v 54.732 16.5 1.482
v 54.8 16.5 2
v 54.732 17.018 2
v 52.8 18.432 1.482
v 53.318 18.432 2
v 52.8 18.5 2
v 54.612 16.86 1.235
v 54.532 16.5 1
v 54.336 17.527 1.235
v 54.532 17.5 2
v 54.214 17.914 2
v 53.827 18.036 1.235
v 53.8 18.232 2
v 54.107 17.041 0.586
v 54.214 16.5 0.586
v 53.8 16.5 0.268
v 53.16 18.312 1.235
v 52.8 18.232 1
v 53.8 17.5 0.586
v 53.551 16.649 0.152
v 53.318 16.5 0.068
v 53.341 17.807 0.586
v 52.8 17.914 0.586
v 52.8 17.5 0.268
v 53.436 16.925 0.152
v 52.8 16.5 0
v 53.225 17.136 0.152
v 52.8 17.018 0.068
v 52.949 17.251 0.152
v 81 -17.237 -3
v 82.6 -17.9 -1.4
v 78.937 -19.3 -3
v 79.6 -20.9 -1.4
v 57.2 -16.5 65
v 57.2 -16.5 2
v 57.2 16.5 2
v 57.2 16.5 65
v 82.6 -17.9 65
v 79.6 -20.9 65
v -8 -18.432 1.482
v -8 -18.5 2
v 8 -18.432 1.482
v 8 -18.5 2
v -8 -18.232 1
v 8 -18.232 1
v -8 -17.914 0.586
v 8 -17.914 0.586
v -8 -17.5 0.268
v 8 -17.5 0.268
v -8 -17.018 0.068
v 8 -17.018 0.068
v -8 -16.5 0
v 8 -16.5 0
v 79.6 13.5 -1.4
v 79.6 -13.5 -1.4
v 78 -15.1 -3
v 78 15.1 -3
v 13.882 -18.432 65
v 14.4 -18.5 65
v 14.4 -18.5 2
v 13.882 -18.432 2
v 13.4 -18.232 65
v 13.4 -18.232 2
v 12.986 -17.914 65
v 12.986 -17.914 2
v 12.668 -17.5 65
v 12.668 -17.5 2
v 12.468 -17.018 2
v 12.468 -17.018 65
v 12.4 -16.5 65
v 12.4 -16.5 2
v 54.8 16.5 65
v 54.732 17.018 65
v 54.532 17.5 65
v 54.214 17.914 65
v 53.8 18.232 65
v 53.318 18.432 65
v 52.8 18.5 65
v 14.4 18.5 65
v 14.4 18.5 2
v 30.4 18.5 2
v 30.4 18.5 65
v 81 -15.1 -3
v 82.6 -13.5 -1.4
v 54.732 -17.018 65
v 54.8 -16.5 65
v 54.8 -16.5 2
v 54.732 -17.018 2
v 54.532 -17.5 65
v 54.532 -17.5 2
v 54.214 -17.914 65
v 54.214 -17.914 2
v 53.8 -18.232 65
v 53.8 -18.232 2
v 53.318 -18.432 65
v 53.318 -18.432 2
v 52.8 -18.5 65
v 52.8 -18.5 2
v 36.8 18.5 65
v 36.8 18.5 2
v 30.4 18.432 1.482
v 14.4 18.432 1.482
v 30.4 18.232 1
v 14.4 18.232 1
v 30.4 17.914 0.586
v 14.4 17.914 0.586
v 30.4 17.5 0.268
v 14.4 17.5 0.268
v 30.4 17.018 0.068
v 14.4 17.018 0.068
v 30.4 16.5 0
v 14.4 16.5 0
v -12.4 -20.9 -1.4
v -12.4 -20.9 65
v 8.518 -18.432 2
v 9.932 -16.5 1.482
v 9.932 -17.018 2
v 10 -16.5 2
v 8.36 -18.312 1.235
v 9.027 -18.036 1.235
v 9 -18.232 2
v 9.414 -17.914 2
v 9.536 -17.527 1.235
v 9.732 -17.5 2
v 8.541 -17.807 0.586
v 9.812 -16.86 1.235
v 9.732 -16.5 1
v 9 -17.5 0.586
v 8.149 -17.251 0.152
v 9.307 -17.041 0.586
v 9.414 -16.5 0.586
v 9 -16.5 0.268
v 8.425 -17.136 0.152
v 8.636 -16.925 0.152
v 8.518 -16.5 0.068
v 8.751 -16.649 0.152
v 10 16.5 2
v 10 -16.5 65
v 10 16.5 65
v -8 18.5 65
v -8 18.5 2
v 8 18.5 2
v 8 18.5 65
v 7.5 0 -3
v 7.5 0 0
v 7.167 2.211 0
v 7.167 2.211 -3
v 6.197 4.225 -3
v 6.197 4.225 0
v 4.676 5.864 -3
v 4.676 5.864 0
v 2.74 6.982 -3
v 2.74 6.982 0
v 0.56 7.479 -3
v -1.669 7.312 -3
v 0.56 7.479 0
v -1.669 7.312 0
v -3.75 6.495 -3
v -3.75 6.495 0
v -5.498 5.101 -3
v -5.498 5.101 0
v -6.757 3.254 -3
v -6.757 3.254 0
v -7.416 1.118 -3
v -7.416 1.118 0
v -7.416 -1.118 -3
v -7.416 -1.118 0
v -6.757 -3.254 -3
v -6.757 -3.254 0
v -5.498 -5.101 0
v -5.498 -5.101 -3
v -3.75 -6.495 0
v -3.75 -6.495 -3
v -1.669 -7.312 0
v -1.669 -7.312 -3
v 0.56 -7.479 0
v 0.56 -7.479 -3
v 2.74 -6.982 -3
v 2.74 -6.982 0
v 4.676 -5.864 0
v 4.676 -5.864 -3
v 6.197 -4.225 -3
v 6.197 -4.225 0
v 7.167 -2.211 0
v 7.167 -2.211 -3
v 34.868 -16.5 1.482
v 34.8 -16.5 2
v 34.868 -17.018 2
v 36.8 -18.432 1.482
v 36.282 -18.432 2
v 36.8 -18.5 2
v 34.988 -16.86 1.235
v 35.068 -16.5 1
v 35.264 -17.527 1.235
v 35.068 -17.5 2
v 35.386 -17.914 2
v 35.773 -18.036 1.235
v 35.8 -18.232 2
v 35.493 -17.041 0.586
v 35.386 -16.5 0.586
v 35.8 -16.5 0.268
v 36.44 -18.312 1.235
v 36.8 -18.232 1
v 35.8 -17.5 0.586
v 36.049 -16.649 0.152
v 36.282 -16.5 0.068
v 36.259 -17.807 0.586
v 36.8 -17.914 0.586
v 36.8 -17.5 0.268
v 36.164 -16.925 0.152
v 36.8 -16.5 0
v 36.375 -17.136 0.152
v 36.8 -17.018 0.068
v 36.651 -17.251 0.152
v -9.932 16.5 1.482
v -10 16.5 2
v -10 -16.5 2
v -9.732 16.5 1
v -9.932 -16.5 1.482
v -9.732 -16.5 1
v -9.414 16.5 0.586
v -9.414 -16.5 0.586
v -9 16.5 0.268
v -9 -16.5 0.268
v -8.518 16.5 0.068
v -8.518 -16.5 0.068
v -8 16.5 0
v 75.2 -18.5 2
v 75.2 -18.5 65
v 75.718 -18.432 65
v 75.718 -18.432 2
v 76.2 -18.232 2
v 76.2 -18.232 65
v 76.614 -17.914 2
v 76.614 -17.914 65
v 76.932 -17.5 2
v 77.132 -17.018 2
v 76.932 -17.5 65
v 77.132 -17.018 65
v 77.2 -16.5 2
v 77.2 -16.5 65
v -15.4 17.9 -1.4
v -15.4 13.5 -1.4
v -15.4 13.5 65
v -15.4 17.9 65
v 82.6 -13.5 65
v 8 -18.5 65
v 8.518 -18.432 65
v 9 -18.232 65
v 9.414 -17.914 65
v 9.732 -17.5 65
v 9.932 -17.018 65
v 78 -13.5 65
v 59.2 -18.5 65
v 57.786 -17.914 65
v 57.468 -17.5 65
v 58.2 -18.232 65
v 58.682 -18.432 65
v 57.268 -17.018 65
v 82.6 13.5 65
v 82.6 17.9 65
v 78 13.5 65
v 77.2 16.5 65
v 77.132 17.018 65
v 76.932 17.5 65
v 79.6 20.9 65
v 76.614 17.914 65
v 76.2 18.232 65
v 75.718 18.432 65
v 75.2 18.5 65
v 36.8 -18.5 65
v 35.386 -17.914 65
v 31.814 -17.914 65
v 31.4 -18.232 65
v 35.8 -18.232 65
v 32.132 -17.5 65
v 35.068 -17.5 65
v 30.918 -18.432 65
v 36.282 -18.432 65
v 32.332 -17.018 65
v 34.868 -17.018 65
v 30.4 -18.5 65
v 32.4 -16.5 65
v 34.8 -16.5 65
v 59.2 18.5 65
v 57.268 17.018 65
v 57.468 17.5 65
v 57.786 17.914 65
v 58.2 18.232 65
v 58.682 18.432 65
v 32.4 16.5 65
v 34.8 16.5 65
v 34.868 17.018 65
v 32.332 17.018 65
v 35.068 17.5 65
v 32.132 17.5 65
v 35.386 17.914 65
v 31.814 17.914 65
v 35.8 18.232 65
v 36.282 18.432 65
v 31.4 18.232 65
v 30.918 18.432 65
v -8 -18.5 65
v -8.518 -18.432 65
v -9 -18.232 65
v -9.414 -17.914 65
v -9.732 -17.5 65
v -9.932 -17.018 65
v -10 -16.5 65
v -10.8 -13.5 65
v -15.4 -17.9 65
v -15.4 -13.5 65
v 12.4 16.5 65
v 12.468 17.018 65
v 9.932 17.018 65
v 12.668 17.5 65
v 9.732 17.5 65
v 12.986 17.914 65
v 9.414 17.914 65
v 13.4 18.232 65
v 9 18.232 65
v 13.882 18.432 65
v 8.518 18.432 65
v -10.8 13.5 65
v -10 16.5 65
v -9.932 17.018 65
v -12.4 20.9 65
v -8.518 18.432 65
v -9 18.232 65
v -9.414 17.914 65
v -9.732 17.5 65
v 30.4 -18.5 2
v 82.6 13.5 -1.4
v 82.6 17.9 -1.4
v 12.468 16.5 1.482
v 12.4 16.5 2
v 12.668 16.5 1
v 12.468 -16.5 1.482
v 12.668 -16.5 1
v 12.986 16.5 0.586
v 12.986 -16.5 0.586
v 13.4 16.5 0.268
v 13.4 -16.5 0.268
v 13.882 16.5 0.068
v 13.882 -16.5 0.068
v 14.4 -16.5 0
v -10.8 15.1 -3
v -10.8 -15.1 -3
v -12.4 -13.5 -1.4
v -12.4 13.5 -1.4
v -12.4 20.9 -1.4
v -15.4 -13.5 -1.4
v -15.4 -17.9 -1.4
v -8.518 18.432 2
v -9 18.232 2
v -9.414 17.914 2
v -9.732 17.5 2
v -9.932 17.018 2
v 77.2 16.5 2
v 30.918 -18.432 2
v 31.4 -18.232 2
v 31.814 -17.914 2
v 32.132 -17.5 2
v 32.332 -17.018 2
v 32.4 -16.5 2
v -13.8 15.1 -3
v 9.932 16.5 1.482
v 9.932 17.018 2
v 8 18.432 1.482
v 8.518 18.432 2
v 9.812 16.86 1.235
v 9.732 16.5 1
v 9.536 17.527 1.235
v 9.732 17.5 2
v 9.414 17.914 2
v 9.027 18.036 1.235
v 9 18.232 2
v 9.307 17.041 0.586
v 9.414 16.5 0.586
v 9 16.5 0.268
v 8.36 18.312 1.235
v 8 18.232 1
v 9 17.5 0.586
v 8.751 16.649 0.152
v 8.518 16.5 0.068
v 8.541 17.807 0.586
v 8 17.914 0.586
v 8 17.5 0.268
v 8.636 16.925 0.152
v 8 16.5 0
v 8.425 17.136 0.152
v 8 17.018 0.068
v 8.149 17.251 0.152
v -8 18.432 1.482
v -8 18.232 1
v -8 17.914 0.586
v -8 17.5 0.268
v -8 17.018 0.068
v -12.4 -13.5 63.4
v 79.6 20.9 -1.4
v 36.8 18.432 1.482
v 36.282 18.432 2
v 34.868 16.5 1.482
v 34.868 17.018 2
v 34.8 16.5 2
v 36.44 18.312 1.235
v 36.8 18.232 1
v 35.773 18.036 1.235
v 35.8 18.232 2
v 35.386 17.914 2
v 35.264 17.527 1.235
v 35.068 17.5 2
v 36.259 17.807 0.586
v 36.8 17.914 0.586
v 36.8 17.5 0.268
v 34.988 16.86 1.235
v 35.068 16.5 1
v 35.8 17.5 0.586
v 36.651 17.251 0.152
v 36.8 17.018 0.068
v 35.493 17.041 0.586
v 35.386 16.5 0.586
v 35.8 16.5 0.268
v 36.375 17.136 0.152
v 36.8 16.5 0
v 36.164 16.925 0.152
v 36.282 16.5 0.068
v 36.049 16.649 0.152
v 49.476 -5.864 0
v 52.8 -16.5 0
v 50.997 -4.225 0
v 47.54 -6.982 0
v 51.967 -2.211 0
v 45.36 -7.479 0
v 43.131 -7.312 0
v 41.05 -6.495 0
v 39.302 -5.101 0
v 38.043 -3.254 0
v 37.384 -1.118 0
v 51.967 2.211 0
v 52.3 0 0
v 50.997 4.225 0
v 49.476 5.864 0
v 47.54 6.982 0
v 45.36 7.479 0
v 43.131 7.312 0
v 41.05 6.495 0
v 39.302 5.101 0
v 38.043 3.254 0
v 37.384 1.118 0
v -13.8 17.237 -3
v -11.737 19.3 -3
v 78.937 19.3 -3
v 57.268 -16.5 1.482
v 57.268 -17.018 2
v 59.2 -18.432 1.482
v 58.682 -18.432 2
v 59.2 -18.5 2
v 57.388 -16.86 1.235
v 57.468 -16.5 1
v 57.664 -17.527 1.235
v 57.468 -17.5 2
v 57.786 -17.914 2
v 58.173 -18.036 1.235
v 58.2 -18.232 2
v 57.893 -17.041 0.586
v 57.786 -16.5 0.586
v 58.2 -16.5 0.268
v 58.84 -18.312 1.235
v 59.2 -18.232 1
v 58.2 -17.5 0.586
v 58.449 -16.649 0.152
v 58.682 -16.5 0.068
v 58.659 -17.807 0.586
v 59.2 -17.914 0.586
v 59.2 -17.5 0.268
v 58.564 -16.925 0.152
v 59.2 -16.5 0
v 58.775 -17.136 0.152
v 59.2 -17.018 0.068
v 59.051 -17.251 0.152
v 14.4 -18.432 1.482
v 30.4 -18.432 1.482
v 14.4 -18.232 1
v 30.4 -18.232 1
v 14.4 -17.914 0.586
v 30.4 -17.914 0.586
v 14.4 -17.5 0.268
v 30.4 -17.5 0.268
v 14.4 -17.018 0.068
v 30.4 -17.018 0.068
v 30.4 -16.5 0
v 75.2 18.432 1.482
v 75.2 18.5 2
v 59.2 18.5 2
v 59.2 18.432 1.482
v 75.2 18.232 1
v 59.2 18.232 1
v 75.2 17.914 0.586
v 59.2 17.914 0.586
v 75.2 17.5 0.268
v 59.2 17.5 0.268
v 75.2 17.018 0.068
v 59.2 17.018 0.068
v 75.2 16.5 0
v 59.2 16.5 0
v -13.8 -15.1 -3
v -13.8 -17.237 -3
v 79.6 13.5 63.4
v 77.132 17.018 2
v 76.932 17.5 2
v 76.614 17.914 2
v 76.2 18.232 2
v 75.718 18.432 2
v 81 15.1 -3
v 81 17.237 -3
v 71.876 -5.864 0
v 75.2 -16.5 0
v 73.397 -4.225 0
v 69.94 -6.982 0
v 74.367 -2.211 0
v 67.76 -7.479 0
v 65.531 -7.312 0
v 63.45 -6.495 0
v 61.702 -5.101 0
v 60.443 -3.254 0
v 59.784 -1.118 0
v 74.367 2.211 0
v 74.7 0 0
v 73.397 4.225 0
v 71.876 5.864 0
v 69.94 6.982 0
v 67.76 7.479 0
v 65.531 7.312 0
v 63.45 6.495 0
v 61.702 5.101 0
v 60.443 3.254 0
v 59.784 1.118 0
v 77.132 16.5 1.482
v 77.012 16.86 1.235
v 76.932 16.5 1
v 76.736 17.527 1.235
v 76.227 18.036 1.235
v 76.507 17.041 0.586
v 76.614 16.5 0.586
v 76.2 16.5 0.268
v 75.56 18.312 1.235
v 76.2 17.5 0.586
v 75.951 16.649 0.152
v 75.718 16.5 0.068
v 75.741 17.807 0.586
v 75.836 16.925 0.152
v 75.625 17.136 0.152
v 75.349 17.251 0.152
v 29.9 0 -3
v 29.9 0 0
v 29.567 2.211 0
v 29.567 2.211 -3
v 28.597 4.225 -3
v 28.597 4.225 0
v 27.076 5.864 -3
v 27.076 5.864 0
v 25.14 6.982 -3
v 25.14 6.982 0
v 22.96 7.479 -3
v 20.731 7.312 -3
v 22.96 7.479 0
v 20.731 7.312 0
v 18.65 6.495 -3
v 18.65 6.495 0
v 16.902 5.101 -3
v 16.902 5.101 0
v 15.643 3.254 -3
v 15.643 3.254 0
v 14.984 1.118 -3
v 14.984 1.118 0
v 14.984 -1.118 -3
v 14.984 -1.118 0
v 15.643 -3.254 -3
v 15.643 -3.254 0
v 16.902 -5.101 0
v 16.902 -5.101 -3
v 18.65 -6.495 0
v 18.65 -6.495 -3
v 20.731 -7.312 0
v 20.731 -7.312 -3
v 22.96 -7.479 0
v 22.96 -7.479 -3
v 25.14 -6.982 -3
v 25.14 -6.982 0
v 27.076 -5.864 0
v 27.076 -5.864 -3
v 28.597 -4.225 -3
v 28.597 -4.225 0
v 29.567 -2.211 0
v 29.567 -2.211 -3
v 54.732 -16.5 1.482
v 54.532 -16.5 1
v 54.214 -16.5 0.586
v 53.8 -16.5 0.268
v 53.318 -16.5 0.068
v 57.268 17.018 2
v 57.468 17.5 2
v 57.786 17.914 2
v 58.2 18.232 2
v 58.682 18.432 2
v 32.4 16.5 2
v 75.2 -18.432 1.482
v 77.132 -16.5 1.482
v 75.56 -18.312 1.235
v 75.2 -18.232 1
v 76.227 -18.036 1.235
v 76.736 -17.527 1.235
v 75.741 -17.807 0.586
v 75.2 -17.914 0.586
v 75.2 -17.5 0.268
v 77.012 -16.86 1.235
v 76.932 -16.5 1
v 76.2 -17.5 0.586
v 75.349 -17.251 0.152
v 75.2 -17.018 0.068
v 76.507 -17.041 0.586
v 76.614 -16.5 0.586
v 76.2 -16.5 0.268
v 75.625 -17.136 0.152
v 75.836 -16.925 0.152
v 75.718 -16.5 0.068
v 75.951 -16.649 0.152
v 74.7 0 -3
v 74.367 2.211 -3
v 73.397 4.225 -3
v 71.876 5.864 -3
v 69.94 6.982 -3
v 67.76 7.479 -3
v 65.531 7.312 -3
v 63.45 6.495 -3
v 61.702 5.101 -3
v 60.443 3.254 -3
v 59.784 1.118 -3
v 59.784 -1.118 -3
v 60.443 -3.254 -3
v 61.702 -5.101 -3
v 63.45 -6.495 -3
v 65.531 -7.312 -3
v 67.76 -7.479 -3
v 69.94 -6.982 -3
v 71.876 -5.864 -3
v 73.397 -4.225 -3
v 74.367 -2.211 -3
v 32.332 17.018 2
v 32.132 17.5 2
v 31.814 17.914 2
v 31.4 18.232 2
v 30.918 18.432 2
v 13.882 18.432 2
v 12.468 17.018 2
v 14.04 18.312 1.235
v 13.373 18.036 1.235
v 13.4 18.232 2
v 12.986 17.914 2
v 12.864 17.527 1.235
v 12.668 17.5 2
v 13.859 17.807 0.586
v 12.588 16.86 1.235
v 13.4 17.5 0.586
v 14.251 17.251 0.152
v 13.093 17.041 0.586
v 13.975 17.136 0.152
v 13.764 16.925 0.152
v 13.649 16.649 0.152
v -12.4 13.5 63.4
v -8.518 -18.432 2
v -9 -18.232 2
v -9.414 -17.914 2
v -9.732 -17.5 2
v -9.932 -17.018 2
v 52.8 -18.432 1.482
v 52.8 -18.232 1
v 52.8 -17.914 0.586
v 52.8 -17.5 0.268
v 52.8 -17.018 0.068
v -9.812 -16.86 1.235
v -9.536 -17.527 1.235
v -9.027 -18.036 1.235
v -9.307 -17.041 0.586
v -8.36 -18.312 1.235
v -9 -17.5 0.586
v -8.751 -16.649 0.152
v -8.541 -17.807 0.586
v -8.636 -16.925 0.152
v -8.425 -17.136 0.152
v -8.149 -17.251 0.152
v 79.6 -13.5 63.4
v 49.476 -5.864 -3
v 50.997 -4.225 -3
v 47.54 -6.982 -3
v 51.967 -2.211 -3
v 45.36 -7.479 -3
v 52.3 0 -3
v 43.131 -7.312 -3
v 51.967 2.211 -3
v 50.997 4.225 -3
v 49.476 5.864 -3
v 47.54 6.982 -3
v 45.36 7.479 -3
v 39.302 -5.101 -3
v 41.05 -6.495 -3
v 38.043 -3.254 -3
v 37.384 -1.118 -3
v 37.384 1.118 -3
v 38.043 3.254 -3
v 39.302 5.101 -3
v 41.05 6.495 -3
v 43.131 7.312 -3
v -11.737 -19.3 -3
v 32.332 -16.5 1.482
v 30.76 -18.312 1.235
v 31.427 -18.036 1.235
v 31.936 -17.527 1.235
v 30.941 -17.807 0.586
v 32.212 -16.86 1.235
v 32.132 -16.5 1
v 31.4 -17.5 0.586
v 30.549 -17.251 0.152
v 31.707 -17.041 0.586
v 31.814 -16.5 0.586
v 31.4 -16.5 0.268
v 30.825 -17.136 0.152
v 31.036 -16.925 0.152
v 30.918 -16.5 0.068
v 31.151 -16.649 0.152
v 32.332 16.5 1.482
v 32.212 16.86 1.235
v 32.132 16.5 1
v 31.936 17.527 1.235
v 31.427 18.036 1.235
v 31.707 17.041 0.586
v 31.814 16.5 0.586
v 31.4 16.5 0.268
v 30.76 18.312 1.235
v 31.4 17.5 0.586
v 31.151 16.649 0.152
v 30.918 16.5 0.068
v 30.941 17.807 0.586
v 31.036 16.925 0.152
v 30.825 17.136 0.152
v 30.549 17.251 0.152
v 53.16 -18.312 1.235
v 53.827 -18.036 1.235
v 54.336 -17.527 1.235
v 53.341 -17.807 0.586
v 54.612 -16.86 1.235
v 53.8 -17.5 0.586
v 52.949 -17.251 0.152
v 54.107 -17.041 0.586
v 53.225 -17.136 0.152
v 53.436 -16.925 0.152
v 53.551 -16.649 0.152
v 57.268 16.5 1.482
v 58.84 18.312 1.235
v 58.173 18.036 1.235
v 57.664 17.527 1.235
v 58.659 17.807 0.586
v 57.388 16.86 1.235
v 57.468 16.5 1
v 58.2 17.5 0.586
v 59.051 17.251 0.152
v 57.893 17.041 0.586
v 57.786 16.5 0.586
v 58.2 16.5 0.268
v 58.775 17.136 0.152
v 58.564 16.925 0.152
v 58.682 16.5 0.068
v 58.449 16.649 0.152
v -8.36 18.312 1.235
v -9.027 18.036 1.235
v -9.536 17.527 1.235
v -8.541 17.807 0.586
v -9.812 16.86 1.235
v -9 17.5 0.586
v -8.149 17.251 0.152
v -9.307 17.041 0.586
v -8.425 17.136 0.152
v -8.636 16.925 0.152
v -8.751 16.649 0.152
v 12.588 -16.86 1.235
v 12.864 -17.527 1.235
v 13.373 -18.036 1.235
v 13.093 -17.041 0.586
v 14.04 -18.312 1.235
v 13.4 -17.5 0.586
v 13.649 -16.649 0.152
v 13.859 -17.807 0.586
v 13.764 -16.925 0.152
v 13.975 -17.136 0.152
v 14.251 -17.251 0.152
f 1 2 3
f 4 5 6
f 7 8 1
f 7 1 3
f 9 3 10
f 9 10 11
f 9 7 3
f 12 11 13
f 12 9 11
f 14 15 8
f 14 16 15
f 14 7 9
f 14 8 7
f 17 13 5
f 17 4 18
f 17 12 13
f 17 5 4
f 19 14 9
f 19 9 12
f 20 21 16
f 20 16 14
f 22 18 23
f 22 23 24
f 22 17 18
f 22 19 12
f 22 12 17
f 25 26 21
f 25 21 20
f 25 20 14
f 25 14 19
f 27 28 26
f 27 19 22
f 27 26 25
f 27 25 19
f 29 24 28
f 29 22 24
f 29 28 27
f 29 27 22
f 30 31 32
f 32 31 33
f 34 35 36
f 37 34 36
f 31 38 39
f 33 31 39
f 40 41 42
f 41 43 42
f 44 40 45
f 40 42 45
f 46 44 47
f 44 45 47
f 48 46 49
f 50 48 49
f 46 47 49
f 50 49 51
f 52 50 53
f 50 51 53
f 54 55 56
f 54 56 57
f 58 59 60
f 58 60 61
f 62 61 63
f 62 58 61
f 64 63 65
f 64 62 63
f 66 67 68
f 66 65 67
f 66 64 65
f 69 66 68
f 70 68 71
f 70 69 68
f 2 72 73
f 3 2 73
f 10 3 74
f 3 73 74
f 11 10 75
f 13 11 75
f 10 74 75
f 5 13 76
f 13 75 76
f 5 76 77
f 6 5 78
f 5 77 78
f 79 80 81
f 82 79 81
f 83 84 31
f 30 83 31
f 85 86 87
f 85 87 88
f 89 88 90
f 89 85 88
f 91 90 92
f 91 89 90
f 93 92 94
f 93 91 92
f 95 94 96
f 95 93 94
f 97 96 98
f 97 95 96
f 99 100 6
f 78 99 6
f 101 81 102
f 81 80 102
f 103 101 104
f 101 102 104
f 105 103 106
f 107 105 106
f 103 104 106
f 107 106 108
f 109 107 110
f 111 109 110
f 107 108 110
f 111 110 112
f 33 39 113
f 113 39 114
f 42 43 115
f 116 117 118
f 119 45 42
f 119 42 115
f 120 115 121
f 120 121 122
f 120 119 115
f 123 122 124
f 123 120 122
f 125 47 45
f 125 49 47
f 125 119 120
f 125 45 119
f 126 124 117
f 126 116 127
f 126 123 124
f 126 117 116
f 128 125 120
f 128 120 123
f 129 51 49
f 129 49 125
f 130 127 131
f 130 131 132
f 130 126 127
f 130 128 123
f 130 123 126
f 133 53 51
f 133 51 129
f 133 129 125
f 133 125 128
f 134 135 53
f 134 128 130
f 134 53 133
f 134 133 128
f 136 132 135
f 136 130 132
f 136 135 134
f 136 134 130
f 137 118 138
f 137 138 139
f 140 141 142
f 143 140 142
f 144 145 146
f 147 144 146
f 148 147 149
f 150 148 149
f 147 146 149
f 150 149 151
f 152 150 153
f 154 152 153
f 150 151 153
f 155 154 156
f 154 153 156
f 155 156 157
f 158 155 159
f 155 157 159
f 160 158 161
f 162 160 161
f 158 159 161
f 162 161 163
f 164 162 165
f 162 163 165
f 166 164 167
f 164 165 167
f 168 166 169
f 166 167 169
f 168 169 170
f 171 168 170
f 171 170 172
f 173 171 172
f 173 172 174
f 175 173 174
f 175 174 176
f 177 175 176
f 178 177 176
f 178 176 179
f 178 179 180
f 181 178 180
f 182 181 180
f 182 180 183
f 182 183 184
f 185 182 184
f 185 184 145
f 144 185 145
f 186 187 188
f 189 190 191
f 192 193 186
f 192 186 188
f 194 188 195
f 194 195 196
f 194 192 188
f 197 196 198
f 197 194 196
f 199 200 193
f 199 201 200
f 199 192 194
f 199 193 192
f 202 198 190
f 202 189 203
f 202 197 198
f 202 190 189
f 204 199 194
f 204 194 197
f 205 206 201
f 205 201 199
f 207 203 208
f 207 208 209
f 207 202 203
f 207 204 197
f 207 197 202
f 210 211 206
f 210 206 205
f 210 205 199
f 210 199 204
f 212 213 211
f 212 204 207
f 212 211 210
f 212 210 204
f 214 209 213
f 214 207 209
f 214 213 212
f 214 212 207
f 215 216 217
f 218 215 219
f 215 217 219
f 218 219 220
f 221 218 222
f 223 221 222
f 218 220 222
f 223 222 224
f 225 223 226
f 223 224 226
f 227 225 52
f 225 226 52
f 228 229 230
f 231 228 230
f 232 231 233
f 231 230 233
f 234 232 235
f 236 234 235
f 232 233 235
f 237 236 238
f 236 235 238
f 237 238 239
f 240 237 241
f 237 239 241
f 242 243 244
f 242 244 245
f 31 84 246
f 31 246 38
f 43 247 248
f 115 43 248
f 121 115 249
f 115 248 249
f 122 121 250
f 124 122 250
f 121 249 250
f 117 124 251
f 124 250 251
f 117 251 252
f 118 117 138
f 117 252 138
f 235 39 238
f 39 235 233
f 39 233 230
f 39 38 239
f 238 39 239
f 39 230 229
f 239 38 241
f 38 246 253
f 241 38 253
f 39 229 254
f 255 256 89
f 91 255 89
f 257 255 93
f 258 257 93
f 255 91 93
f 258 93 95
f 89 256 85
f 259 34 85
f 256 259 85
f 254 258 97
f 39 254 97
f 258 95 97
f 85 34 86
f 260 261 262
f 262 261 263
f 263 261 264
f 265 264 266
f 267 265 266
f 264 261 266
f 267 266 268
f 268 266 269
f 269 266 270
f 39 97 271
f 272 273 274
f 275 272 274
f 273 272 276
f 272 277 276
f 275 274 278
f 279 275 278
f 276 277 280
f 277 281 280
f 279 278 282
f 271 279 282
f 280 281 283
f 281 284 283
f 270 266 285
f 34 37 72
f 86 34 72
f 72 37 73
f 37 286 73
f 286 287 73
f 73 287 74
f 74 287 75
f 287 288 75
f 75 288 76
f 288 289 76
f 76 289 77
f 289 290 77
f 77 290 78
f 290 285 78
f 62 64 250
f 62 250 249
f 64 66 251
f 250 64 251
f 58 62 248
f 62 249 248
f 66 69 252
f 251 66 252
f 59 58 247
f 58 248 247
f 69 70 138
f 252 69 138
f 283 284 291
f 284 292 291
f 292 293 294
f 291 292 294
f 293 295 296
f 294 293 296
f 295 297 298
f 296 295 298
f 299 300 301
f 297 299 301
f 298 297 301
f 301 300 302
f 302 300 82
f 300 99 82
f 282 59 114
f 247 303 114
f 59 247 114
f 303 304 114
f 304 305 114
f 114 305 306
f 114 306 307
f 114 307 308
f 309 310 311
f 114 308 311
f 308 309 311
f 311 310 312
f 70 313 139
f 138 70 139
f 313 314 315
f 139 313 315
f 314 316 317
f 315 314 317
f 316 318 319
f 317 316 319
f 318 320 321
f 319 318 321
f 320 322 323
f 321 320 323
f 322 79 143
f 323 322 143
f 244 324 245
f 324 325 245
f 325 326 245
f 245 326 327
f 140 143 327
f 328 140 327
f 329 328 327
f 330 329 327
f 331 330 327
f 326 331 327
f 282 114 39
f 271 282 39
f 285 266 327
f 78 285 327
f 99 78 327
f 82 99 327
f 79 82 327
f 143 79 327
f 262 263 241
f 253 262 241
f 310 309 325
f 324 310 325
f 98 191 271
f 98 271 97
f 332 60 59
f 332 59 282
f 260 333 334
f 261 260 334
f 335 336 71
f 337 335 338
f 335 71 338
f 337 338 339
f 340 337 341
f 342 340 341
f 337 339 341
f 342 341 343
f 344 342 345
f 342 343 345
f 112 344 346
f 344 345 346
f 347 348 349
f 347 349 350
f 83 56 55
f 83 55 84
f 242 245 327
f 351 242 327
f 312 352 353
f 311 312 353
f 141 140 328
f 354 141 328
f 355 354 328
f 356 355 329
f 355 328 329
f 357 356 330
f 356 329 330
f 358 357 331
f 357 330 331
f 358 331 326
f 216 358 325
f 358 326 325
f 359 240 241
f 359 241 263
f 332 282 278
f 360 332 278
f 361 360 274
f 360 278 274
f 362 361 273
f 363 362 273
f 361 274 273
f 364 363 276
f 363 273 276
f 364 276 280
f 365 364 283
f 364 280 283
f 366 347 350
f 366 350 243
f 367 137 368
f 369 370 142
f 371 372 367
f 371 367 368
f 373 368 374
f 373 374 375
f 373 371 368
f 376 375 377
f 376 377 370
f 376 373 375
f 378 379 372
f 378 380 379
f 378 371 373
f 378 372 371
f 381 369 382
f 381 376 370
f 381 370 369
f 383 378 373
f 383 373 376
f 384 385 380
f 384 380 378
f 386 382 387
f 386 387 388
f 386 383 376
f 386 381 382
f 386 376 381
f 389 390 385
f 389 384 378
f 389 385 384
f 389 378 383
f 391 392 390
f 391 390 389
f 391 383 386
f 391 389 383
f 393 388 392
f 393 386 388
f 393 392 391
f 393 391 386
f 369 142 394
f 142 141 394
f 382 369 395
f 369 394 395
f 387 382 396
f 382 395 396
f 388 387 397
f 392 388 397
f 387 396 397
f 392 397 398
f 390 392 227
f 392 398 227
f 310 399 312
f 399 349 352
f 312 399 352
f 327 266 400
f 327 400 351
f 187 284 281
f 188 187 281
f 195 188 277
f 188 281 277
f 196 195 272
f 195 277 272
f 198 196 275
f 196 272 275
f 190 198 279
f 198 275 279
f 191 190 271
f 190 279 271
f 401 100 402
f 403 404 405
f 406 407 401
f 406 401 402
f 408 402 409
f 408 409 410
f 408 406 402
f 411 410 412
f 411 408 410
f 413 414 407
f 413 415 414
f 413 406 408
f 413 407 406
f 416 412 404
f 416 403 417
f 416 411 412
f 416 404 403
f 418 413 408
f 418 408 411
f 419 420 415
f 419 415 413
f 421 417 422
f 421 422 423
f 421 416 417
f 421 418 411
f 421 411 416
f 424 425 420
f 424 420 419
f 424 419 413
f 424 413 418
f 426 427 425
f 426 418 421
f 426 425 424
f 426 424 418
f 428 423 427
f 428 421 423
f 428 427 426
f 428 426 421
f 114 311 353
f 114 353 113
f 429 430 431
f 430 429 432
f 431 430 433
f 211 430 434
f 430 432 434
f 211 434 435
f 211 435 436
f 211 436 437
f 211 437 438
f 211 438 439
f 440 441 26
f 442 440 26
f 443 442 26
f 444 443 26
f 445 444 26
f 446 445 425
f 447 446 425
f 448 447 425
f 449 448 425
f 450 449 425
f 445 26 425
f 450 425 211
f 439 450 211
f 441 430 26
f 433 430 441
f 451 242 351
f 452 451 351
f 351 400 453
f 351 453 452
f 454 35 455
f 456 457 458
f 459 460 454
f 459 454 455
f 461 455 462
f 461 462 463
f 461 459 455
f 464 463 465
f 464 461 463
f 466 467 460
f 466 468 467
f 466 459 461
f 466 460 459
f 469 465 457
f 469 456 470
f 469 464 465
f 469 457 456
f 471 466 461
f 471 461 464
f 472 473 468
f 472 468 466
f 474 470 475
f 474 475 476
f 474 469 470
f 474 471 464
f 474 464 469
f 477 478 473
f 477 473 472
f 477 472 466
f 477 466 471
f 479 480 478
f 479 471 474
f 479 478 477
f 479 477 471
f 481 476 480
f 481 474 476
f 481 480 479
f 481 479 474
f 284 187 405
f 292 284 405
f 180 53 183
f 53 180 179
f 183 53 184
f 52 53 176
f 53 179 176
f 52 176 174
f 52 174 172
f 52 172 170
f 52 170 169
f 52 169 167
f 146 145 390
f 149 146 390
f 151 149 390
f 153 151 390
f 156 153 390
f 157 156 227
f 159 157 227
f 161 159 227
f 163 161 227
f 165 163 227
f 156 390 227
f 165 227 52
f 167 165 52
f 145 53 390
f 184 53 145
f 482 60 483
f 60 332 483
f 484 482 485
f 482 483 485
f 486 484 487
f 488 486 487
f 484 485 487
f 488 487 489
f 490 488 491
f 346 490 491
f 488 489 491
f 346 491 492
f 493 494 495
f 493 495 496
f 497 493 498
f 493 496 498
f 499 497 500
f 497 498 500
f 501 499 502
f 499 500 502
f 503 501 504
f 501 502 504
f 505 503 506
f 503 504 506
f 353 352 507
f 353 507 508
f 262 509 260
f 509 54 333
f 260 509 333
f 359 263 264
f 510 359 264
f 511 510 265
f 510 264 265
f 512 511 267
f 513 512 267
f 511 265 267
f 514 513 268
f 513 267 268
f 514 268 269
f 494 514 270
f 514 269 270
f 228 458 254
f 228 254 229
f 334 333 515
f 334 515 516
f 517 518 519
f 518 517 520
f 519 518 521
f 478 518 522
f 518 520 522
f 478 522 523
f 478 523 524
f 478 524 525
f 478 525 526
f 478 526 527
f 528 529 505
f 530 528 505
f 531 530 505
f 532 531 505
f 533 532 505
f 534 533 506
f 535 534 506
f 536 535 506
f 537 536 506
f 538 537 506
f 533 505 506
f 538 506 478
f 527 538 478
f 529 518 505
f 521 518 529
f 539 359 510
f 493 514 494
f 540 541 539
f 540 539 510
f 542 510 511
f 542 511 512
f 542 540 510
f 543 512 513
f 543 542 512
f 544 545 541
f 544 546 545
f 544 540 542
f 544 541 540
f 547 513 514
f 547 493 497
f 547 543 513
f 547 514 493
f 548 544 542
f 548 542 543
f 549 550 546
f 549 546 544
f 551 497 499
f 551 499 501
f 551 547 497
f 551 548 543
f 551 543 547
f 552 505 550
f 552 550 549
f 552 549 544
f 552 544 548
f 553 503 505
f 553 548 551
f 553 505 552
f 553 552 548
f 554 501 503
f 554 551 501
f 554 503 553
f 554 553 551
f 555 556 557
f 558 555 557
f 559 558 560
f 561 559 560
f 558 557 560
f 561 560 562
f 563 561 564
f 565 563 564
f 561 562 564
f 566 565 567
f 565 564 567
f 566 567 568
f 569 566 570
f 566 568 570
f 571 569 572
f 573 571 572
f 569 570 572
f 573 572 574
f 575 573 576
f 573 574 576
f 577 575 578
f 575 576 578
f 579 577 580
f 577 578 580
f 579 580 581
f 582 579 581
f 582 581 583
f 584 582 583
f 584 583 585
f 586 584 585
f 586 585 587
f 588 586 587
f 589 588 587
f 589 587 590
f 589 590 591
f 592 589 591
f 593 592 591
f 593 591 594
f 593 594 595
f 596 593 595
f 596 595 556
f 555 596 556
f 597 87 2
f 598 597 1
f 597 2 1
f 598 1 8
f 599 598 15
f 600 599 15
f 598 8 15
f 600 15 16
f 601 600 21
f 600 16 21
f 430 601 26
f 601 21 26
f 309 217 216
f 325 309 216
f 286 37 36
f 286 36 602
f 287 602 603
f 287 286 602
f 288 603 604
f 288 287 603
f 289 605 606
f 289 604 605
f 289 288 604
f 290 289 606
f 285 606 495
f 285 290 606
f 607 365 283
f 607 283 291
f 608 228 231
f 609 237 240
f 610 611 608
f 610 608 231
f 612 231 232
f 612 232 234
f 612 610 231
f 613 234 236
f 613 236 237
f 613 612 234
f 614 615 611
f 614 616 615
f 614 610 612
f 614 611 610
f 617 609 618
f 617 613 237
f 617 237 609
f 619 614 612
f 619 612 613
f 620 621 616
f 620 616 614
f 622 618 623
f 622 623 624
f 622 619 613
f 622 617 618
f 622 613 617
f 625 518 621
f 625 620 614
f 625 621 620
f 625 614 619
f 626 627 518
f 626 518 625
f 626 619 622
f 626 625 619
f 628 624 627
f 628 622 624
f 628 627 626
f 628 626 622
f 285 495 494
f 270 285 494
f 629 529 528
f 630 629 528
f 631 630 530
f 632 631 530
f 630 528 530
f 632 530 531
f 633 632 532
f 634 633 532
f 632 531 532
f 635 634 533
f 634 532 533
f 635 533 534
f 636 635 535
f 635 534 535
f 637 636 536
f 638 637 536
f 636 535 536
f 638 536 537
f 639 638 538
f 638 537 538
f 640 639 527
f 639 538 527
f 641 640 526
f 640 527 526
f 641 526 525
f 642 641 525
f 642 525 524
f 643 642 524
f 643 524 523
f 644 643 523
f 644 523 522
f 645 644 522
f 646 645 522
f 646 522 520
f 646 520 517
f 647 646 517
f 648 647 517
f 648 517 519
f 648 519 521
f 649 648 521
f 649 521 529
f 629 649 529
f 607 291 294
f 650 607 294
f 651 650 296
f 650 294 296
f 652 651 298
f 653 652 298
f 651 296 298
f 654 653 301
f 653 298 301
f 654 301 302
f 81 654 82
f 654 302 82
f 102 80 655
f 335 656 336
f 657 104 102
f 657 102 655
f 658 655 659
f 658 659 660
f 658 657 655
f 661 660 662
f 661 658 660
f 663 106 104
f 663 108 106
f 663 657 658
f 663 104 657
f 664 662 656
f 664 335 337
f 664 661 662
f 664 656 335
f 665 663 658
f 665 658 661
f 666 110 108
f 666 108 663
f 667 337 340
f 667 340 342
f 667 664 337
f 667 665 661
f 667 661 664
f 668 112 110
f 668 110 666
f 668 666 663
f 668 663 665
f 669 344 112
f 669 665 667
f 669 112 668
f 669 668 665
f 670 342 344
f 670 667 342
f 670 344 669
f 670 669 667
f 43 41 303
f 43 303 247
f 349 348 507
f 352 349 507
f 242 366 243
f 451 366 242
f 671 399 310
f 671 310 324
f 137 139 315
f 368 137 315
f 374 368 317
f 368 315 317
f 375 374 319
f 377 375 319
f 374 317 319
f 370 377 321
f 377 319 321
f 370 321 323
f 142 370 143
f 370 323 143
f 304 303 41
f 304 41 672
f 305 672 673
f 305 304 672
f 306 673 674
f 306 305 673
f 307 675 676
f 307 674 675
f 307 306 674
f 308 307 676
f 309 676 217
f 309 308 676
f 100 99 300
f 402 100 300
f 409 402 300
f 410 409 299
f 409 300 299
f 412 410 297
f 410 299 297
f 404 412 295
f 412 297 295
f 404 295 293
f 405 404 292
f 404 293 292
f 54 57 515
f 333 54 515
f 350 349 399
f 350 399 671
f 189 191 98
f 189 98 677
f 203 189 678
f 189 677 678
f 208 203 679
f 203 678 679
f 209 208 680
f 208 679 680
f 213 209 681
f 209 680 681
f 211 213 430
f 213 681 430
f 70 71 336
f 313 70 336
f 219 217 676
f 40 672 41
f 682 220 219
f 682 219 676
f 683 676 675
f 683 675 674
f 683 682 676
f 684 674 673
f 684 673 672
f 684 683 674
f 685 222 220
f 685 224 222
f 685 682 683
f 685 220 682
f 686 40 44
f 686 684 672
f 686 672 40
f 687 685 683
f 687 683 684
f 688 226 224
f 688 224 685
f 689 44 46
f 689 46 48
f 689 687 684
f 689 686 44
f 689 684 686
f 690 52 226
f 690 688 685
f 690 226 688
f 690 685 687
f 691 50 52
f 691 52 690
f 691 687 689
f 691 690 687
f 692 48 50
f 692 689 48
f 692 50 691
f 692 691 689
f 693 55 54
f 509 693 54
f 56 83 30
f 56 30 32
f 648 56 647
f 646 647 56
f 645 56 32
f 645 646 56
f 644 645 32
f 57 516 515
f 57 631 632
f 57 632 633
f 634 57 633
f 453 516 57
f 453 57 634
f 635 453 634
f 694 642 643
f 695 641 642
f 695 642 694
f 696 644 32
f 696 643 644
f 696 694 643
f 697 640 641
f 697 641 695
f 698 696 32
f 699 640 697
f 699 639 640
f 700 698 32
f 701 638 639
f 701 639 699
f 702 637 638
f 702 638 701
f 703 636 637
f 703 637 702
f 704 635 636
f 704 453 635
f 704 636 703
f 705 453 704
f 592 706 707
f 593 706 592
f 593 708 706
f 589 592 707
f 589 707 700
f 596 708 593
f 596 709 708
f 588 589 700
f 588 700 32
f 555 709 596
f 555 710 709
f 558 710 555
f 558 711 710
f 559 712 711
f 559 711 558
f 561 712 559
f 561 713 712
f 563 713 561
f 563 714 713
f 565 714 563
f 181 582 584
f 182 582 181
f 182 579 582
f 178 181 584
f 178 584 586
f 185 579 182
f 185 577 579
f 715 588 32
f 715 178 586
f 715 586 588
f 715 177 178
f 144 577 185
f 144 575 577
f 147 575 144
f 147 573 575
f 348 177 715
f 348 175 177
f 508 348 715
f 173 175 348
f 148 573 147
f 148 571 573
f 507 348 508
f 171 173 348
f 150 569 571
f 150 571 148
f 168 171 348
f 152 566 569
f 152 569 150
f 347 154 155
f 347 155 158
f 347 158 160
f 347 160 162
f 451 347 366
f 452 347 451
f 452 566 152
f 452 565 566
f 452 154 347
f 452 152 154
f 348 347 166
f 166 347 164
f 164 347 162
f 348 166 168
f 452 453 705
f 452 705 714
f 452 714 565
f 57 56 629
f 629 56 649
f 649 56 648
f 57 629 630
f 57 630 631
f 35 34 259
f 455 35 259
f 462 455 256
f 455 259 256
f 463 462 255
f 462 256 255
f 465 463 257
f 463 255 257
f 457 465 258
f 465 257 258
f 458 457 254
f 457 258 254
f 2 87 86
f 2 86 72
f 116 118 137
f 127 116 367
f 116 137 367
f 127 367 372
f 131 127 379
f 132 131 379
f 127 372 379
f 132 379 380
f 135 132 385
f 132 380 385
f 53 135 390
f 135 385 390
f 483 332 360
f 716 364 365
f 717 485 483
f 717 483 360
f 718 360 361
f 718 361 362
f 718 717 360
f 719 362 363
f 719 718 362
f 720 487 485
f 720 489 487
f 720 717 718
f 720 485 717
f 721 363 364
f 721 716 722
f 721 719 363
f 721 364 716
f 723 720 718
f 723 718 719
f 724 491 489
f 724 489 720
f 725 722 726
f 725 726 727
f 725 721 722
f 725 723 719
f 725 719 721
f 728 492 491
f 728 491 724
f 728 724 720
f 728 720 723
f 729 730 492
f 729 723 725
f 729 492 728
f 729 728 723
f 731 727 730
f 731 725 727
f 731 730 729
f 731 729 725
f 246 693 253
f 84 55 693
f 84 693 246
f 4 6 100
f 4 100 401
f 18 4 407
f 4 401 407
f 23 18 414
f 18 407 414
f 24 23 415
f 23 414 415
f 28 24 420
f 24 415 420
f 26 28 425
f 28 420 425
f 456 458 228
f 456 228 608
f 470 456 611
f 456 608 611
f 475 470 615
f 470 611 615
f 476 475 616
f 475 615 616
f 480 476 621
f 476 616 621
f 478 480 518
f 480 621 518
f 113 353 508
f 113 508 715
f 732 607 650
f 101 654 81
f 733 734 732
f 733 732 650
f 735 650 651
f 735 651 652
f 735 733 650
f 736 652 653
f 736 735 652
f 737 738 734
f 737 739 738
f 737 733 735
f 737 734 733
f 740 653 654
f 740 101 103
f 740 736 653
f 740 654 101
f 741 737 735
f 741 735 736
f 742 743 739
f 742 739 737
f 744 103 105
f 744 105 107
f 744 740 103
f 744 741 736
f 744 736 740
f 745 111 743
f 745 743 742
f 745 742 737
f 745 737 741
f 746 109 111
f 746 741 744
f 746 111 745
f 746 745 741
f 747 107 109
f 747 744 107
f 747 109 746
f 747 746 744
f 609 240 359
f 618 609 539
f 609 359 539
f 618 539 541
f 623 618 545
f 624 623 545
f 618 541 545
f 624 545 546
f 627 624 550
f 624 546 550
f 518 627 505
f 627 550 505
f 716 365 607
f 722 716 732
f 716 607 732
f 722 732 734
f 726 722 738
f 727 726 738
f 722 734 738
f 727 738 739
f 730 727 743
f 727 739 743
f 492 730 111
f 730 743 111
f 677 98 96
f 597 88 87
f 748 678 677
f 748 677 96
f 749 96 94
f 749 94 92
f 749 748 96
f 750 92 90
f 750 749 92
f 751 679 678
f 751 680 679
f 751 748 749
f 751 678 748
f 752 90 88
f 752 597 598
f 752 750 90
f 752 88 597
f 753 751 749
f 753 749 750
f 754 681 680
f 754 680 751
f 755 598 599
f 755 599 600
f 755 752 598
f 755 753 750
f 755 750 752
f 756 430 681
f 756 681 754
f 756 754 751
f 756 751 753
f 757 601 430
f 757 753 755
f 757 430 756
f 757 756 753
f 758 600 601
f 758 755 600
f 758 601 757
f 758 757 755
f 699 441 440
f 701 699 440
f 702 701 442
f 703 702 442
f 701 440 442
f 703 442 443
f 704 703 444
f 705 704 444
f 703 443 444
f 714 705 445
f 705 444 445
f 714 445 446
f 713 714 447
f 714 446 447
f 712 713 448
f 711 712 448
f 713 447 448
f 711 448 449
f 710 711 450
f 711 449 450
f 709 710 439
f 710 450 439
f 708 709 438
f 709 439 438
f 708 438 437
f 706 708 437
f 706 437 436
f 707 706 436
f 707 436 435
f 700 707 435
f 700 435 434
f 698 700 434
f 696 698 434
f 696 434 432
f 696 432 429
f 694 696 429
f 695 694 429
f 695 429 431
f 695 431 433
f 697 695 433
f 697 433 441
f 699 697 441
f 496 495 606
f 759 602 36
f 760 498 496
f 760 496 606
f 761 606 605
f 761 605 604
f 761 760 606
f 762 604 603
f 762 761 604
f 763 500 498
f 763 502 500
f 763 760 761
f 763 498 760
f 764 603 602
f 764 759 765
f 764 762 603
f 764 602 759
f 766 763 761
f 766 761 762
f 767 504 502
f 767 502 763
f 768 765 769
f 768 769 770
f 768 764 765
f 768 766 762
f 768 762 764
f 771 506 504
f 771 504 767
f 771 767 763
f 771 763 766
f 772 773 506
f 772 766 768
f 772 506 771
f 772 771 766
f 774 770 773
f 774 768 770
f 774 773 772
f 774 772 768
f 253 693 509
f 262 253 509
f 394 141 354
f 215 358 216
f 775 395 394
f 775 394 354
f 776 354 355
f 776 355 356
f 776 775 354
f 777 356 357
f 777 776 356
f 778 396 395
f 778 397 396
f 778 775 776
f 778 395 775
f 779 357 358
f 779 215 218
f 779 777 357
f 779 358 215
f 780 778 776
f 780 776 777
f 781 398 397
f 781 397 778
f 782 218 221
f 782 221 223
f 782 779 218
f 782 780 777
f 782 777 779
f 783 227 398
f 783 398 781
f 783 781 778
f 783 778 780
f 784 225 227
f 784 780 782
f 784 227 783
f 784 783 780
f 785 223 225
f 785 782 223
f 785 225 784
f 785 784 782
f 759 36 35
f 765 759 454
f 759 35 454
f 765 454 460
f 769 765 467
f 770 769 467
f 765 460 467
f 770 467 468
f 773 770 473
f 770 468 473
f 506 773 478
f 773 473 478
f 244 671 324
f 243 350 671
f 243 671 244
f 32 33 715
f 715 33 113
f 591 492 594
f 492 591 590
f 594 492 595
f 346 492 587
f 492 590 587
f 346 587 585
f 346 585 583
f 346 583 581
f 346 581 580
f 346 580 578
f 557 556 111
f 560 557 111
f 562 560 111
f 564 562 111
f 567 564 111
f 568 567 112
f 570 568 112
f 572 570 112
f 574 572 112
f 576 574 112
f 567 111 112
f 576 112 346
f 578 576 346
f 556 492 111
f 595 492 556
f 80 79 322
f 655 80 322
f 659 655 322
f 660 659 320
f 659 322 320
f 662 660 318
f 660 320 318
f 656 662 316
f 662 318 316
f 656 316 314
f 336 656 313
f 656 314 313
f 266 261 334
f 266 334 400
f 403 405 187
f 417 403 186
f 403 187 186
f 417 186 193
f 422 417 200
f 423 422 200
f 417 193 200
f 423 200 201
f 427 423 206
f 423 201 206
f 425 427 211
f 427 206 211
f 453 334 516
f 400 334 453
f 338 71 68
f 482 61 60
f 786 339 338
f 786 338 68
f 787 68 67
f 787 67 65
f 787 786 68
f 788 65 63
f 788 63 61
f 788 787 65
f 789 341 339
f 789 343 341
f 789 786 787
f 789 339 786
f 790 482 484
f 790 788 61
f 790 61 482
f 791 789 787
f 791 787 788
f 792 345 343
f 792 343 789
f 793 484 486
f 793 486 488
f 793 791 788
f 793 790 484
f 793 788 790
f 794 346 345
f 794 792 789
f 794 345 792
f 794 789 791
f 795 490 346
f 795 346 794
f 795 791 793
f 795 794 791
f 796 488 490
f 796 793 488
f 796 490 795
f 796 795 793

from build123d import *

# Parameters (mm, degrees)
SKETCH1_W           = 92
SKETCH1_H           = 41.8
SKETCH1_W_2         = 20
SKETCH1_H_2         = 37
BOSS_EXTRUDE1_DEPTH = 65
SKETCH2_W           = 92
SKETCH2_H           = 41.8
BOSS_EXTRUDE2_DEPTH = 3
BOSS_EXTRUDE3_DEPTH = 68
CHAMFER4_SIZE       = 1.6
SKETCH3_R           = 7.5
CUT_EXTRUDE1_DEPTH  = 4
FILLET1_R           = 2
FILLET2_R           = 2
CHAMFER5_SIZE       = 1.6


with BuildPart() as part:
    # Sketch1 → Boss-Extrude1 (new body)
    with BuildSketch(Plane.XY):
        with Locations((33.6, 0)):
            Rectangle(SKETCH1_W, SKETCH1_H)
        with Locations((22.4, 0)):
            Rectangle(SKETCH1_W_2, SKETCH1_H_2, mode=Mode.SUBTRACT)
        Rectangle(SKETCH1_W_2, SKETCH1_H_2, mode=Mode.SUBTRACT)
        with Locations((44.8, 0)):
            Rectangle(SKETCH1_W_2, SKETCH1_H_2, mode=Mode.SUBTRACT)
        with Locations((67.2, 0)):
            Rectangle(SKETCH1_W_2, SKETCH1_H_2, mode=Mode.SUBTRACT)
    extrude(amount=BOSS_EXTRUDE1_DEPTH)

    # Sketch2 → Boss-Extrude2 (add)
    with BuildSketch(Plane(origin=(0, 0, 0), x_dir=(-1, 0, 0), z_dir=(0, 0, -1))):
        with Locations((-33.6, 0)):
            Rectangle(SKETCH2_W, SKETCH2_H)
    extrude(amount=BOSS_EXTRUDE2_DEPTH)

    # Sketch4 → Boss-Extrude3 (add)
    with BuildSketch(Plane(origin=(0, 0, -3), x_dir=(-1, 0, 0), z_dir=(0, 0, -1))):
        Polygon((-79.6, 20.9), (-79.6, 13.5), (-82.6, 13.5), (-82.6, 17.9), align=None)
        Polygon((-82.6, -13.5), (-82.6, -17.9), (-79.6, -20.9), (-79.6, -13.5), align=None)
    boss_extrude3 = extrude(amount=-BOSS_EXTRUDE3_DEPTH)

    # Mirror1: Boss-Extrude3 across plane
    add(boss_extrude3.mirror(Plane.ZY.offset(-33.6)))

    # Chamfer4
    chamfer4_edges = [part.edges().sort_by_distance(p)[0] for p in [
        (81.1, -13.5, -3),
        (82.6, -15.7, -3),
        (81.1, -19.4, -3),
        (-13.9, 19.4, -3),
        (-15.4, 15.7, -3),
        (-13.9, 13.5, -3),
        (-12.4, 0, -3),
        (-13.9, -13.5, -3),
        (-15.4, -15.7, -3),
        (-13.9, -19.4, -3),
        (33.6, 20.9, -3),
        (33.6, -20.9, -3),
        (79.6, 0, -3),
        (81.1, 19.4, -3),
        (82.6, 15.7, -3),
        (81.1, 13.5, -3),
    ]]
    chamfer(chamfer4_edges, length=CHAMFER4_SIZE)

    # Sketch3 → Cut-Extrude1 (cut, through all)
    with BuildSketch(Plane.XY):
        Circle(SKETCH3_R)
        with Locations((22.4, 0)):
            Circle(SKETCH3_R)
        with Locations((44.8, 0)):
            Circle(SKETCH3_R)
        with Locations((67.2, 0)):
            Circle(SKETCH3_R)
    extrude(amount=-CUT_EXTRUDE1_DEPTH, mode=Mode.SUBTRACT)

    # Fillet1
    fillet1_edges = [part.edges().sort_by_distance(p)[0] for p in [
        (10, -18.5, 32.5),
        (10, 18.5, 32.5),
        (-10, 18.5, 32.5),
        (-10, -18.5, 32.5),
        (32.4, 18.5, 32.5),
        (12.4, 18.5, 32.5),
        (12.4, -18.5, 32.5),
        (32.4, -18.5, 32.5),
        (54.8, 18.5, 32.5),
        (34.8, 18.5, 32.5),
        (34.8, -18.5, 32.5),
        (54.8, -18.5, 32.5),
        (77.2, 18.5, 32.5),
        (57.2, 18.5, 32.5),
        (57.2, -18.5, 32.5),
        (77.2, -18.5, 32.5),
    ]]
    fillet(fillet1_edges, radius=FILLET1_R)

    # Fillet2
    fillet2_edges = [part.edges().sort_by_distance(p)[0] for p in [
        (67.2, -18.5, 0),
        (77.2, 0, 0),
        (67.2, 18.5, 0),
        (57.2, 0, 0),
        (76.614213562, 17.914213562, 0),
        (57.785786438, 17.914213562, 0),
        (57.785786438, -17.914213562, 0),
        (76.614213562, -17.914213562, 0),
        (44.8, -18.5, 0),
        (54.8, 0, 0),
        (44.8, 18.5, 0),
        (34.8, 0, 0),
        (54.214213562, 17.914213562, 0),
        (35.385786438, 17.914213562, 0),
        (35.385786438, -17.914213562, 0),
        (54.214213562, -17.914213562, 0),
        (22.4, -18.5, 0),
        (32.4, 0, 0),
        (22.4, 18.5, 0),
        (12.4, 0, 0),
        (12.985786438, 17.914213562, 0),
        (31.814213562, 17.914213562, 0),
        (12.985786438, -17.914213562, 0),
        (31.814213562, -17.914213562, 0),
        (0, -18.5, 0),
        (10, 0, 0),
        (0, 18.5, 0),
        (-10, 0, 0),
        (-9.414213562, 17.914213562, 0),
        (9.414213562, 17.914213562, 0),
        (-9.414213562, -17.914213562, 0),
        (9.414213562, -17.914213562, 0),
    ]]
    fillet(fillet2_edges, radius=FILLET2_R)

    # Chamfer5
    chamfer5_edges = [part.edges().sort_by_distance(p)[0] for p in [
        (79.6, 0, 65),
        (-12.4, 0, 65),
    ]]
    chamfer(chamfer5_edges, length=CHAMFER5_SIZE)


solid = part.part
